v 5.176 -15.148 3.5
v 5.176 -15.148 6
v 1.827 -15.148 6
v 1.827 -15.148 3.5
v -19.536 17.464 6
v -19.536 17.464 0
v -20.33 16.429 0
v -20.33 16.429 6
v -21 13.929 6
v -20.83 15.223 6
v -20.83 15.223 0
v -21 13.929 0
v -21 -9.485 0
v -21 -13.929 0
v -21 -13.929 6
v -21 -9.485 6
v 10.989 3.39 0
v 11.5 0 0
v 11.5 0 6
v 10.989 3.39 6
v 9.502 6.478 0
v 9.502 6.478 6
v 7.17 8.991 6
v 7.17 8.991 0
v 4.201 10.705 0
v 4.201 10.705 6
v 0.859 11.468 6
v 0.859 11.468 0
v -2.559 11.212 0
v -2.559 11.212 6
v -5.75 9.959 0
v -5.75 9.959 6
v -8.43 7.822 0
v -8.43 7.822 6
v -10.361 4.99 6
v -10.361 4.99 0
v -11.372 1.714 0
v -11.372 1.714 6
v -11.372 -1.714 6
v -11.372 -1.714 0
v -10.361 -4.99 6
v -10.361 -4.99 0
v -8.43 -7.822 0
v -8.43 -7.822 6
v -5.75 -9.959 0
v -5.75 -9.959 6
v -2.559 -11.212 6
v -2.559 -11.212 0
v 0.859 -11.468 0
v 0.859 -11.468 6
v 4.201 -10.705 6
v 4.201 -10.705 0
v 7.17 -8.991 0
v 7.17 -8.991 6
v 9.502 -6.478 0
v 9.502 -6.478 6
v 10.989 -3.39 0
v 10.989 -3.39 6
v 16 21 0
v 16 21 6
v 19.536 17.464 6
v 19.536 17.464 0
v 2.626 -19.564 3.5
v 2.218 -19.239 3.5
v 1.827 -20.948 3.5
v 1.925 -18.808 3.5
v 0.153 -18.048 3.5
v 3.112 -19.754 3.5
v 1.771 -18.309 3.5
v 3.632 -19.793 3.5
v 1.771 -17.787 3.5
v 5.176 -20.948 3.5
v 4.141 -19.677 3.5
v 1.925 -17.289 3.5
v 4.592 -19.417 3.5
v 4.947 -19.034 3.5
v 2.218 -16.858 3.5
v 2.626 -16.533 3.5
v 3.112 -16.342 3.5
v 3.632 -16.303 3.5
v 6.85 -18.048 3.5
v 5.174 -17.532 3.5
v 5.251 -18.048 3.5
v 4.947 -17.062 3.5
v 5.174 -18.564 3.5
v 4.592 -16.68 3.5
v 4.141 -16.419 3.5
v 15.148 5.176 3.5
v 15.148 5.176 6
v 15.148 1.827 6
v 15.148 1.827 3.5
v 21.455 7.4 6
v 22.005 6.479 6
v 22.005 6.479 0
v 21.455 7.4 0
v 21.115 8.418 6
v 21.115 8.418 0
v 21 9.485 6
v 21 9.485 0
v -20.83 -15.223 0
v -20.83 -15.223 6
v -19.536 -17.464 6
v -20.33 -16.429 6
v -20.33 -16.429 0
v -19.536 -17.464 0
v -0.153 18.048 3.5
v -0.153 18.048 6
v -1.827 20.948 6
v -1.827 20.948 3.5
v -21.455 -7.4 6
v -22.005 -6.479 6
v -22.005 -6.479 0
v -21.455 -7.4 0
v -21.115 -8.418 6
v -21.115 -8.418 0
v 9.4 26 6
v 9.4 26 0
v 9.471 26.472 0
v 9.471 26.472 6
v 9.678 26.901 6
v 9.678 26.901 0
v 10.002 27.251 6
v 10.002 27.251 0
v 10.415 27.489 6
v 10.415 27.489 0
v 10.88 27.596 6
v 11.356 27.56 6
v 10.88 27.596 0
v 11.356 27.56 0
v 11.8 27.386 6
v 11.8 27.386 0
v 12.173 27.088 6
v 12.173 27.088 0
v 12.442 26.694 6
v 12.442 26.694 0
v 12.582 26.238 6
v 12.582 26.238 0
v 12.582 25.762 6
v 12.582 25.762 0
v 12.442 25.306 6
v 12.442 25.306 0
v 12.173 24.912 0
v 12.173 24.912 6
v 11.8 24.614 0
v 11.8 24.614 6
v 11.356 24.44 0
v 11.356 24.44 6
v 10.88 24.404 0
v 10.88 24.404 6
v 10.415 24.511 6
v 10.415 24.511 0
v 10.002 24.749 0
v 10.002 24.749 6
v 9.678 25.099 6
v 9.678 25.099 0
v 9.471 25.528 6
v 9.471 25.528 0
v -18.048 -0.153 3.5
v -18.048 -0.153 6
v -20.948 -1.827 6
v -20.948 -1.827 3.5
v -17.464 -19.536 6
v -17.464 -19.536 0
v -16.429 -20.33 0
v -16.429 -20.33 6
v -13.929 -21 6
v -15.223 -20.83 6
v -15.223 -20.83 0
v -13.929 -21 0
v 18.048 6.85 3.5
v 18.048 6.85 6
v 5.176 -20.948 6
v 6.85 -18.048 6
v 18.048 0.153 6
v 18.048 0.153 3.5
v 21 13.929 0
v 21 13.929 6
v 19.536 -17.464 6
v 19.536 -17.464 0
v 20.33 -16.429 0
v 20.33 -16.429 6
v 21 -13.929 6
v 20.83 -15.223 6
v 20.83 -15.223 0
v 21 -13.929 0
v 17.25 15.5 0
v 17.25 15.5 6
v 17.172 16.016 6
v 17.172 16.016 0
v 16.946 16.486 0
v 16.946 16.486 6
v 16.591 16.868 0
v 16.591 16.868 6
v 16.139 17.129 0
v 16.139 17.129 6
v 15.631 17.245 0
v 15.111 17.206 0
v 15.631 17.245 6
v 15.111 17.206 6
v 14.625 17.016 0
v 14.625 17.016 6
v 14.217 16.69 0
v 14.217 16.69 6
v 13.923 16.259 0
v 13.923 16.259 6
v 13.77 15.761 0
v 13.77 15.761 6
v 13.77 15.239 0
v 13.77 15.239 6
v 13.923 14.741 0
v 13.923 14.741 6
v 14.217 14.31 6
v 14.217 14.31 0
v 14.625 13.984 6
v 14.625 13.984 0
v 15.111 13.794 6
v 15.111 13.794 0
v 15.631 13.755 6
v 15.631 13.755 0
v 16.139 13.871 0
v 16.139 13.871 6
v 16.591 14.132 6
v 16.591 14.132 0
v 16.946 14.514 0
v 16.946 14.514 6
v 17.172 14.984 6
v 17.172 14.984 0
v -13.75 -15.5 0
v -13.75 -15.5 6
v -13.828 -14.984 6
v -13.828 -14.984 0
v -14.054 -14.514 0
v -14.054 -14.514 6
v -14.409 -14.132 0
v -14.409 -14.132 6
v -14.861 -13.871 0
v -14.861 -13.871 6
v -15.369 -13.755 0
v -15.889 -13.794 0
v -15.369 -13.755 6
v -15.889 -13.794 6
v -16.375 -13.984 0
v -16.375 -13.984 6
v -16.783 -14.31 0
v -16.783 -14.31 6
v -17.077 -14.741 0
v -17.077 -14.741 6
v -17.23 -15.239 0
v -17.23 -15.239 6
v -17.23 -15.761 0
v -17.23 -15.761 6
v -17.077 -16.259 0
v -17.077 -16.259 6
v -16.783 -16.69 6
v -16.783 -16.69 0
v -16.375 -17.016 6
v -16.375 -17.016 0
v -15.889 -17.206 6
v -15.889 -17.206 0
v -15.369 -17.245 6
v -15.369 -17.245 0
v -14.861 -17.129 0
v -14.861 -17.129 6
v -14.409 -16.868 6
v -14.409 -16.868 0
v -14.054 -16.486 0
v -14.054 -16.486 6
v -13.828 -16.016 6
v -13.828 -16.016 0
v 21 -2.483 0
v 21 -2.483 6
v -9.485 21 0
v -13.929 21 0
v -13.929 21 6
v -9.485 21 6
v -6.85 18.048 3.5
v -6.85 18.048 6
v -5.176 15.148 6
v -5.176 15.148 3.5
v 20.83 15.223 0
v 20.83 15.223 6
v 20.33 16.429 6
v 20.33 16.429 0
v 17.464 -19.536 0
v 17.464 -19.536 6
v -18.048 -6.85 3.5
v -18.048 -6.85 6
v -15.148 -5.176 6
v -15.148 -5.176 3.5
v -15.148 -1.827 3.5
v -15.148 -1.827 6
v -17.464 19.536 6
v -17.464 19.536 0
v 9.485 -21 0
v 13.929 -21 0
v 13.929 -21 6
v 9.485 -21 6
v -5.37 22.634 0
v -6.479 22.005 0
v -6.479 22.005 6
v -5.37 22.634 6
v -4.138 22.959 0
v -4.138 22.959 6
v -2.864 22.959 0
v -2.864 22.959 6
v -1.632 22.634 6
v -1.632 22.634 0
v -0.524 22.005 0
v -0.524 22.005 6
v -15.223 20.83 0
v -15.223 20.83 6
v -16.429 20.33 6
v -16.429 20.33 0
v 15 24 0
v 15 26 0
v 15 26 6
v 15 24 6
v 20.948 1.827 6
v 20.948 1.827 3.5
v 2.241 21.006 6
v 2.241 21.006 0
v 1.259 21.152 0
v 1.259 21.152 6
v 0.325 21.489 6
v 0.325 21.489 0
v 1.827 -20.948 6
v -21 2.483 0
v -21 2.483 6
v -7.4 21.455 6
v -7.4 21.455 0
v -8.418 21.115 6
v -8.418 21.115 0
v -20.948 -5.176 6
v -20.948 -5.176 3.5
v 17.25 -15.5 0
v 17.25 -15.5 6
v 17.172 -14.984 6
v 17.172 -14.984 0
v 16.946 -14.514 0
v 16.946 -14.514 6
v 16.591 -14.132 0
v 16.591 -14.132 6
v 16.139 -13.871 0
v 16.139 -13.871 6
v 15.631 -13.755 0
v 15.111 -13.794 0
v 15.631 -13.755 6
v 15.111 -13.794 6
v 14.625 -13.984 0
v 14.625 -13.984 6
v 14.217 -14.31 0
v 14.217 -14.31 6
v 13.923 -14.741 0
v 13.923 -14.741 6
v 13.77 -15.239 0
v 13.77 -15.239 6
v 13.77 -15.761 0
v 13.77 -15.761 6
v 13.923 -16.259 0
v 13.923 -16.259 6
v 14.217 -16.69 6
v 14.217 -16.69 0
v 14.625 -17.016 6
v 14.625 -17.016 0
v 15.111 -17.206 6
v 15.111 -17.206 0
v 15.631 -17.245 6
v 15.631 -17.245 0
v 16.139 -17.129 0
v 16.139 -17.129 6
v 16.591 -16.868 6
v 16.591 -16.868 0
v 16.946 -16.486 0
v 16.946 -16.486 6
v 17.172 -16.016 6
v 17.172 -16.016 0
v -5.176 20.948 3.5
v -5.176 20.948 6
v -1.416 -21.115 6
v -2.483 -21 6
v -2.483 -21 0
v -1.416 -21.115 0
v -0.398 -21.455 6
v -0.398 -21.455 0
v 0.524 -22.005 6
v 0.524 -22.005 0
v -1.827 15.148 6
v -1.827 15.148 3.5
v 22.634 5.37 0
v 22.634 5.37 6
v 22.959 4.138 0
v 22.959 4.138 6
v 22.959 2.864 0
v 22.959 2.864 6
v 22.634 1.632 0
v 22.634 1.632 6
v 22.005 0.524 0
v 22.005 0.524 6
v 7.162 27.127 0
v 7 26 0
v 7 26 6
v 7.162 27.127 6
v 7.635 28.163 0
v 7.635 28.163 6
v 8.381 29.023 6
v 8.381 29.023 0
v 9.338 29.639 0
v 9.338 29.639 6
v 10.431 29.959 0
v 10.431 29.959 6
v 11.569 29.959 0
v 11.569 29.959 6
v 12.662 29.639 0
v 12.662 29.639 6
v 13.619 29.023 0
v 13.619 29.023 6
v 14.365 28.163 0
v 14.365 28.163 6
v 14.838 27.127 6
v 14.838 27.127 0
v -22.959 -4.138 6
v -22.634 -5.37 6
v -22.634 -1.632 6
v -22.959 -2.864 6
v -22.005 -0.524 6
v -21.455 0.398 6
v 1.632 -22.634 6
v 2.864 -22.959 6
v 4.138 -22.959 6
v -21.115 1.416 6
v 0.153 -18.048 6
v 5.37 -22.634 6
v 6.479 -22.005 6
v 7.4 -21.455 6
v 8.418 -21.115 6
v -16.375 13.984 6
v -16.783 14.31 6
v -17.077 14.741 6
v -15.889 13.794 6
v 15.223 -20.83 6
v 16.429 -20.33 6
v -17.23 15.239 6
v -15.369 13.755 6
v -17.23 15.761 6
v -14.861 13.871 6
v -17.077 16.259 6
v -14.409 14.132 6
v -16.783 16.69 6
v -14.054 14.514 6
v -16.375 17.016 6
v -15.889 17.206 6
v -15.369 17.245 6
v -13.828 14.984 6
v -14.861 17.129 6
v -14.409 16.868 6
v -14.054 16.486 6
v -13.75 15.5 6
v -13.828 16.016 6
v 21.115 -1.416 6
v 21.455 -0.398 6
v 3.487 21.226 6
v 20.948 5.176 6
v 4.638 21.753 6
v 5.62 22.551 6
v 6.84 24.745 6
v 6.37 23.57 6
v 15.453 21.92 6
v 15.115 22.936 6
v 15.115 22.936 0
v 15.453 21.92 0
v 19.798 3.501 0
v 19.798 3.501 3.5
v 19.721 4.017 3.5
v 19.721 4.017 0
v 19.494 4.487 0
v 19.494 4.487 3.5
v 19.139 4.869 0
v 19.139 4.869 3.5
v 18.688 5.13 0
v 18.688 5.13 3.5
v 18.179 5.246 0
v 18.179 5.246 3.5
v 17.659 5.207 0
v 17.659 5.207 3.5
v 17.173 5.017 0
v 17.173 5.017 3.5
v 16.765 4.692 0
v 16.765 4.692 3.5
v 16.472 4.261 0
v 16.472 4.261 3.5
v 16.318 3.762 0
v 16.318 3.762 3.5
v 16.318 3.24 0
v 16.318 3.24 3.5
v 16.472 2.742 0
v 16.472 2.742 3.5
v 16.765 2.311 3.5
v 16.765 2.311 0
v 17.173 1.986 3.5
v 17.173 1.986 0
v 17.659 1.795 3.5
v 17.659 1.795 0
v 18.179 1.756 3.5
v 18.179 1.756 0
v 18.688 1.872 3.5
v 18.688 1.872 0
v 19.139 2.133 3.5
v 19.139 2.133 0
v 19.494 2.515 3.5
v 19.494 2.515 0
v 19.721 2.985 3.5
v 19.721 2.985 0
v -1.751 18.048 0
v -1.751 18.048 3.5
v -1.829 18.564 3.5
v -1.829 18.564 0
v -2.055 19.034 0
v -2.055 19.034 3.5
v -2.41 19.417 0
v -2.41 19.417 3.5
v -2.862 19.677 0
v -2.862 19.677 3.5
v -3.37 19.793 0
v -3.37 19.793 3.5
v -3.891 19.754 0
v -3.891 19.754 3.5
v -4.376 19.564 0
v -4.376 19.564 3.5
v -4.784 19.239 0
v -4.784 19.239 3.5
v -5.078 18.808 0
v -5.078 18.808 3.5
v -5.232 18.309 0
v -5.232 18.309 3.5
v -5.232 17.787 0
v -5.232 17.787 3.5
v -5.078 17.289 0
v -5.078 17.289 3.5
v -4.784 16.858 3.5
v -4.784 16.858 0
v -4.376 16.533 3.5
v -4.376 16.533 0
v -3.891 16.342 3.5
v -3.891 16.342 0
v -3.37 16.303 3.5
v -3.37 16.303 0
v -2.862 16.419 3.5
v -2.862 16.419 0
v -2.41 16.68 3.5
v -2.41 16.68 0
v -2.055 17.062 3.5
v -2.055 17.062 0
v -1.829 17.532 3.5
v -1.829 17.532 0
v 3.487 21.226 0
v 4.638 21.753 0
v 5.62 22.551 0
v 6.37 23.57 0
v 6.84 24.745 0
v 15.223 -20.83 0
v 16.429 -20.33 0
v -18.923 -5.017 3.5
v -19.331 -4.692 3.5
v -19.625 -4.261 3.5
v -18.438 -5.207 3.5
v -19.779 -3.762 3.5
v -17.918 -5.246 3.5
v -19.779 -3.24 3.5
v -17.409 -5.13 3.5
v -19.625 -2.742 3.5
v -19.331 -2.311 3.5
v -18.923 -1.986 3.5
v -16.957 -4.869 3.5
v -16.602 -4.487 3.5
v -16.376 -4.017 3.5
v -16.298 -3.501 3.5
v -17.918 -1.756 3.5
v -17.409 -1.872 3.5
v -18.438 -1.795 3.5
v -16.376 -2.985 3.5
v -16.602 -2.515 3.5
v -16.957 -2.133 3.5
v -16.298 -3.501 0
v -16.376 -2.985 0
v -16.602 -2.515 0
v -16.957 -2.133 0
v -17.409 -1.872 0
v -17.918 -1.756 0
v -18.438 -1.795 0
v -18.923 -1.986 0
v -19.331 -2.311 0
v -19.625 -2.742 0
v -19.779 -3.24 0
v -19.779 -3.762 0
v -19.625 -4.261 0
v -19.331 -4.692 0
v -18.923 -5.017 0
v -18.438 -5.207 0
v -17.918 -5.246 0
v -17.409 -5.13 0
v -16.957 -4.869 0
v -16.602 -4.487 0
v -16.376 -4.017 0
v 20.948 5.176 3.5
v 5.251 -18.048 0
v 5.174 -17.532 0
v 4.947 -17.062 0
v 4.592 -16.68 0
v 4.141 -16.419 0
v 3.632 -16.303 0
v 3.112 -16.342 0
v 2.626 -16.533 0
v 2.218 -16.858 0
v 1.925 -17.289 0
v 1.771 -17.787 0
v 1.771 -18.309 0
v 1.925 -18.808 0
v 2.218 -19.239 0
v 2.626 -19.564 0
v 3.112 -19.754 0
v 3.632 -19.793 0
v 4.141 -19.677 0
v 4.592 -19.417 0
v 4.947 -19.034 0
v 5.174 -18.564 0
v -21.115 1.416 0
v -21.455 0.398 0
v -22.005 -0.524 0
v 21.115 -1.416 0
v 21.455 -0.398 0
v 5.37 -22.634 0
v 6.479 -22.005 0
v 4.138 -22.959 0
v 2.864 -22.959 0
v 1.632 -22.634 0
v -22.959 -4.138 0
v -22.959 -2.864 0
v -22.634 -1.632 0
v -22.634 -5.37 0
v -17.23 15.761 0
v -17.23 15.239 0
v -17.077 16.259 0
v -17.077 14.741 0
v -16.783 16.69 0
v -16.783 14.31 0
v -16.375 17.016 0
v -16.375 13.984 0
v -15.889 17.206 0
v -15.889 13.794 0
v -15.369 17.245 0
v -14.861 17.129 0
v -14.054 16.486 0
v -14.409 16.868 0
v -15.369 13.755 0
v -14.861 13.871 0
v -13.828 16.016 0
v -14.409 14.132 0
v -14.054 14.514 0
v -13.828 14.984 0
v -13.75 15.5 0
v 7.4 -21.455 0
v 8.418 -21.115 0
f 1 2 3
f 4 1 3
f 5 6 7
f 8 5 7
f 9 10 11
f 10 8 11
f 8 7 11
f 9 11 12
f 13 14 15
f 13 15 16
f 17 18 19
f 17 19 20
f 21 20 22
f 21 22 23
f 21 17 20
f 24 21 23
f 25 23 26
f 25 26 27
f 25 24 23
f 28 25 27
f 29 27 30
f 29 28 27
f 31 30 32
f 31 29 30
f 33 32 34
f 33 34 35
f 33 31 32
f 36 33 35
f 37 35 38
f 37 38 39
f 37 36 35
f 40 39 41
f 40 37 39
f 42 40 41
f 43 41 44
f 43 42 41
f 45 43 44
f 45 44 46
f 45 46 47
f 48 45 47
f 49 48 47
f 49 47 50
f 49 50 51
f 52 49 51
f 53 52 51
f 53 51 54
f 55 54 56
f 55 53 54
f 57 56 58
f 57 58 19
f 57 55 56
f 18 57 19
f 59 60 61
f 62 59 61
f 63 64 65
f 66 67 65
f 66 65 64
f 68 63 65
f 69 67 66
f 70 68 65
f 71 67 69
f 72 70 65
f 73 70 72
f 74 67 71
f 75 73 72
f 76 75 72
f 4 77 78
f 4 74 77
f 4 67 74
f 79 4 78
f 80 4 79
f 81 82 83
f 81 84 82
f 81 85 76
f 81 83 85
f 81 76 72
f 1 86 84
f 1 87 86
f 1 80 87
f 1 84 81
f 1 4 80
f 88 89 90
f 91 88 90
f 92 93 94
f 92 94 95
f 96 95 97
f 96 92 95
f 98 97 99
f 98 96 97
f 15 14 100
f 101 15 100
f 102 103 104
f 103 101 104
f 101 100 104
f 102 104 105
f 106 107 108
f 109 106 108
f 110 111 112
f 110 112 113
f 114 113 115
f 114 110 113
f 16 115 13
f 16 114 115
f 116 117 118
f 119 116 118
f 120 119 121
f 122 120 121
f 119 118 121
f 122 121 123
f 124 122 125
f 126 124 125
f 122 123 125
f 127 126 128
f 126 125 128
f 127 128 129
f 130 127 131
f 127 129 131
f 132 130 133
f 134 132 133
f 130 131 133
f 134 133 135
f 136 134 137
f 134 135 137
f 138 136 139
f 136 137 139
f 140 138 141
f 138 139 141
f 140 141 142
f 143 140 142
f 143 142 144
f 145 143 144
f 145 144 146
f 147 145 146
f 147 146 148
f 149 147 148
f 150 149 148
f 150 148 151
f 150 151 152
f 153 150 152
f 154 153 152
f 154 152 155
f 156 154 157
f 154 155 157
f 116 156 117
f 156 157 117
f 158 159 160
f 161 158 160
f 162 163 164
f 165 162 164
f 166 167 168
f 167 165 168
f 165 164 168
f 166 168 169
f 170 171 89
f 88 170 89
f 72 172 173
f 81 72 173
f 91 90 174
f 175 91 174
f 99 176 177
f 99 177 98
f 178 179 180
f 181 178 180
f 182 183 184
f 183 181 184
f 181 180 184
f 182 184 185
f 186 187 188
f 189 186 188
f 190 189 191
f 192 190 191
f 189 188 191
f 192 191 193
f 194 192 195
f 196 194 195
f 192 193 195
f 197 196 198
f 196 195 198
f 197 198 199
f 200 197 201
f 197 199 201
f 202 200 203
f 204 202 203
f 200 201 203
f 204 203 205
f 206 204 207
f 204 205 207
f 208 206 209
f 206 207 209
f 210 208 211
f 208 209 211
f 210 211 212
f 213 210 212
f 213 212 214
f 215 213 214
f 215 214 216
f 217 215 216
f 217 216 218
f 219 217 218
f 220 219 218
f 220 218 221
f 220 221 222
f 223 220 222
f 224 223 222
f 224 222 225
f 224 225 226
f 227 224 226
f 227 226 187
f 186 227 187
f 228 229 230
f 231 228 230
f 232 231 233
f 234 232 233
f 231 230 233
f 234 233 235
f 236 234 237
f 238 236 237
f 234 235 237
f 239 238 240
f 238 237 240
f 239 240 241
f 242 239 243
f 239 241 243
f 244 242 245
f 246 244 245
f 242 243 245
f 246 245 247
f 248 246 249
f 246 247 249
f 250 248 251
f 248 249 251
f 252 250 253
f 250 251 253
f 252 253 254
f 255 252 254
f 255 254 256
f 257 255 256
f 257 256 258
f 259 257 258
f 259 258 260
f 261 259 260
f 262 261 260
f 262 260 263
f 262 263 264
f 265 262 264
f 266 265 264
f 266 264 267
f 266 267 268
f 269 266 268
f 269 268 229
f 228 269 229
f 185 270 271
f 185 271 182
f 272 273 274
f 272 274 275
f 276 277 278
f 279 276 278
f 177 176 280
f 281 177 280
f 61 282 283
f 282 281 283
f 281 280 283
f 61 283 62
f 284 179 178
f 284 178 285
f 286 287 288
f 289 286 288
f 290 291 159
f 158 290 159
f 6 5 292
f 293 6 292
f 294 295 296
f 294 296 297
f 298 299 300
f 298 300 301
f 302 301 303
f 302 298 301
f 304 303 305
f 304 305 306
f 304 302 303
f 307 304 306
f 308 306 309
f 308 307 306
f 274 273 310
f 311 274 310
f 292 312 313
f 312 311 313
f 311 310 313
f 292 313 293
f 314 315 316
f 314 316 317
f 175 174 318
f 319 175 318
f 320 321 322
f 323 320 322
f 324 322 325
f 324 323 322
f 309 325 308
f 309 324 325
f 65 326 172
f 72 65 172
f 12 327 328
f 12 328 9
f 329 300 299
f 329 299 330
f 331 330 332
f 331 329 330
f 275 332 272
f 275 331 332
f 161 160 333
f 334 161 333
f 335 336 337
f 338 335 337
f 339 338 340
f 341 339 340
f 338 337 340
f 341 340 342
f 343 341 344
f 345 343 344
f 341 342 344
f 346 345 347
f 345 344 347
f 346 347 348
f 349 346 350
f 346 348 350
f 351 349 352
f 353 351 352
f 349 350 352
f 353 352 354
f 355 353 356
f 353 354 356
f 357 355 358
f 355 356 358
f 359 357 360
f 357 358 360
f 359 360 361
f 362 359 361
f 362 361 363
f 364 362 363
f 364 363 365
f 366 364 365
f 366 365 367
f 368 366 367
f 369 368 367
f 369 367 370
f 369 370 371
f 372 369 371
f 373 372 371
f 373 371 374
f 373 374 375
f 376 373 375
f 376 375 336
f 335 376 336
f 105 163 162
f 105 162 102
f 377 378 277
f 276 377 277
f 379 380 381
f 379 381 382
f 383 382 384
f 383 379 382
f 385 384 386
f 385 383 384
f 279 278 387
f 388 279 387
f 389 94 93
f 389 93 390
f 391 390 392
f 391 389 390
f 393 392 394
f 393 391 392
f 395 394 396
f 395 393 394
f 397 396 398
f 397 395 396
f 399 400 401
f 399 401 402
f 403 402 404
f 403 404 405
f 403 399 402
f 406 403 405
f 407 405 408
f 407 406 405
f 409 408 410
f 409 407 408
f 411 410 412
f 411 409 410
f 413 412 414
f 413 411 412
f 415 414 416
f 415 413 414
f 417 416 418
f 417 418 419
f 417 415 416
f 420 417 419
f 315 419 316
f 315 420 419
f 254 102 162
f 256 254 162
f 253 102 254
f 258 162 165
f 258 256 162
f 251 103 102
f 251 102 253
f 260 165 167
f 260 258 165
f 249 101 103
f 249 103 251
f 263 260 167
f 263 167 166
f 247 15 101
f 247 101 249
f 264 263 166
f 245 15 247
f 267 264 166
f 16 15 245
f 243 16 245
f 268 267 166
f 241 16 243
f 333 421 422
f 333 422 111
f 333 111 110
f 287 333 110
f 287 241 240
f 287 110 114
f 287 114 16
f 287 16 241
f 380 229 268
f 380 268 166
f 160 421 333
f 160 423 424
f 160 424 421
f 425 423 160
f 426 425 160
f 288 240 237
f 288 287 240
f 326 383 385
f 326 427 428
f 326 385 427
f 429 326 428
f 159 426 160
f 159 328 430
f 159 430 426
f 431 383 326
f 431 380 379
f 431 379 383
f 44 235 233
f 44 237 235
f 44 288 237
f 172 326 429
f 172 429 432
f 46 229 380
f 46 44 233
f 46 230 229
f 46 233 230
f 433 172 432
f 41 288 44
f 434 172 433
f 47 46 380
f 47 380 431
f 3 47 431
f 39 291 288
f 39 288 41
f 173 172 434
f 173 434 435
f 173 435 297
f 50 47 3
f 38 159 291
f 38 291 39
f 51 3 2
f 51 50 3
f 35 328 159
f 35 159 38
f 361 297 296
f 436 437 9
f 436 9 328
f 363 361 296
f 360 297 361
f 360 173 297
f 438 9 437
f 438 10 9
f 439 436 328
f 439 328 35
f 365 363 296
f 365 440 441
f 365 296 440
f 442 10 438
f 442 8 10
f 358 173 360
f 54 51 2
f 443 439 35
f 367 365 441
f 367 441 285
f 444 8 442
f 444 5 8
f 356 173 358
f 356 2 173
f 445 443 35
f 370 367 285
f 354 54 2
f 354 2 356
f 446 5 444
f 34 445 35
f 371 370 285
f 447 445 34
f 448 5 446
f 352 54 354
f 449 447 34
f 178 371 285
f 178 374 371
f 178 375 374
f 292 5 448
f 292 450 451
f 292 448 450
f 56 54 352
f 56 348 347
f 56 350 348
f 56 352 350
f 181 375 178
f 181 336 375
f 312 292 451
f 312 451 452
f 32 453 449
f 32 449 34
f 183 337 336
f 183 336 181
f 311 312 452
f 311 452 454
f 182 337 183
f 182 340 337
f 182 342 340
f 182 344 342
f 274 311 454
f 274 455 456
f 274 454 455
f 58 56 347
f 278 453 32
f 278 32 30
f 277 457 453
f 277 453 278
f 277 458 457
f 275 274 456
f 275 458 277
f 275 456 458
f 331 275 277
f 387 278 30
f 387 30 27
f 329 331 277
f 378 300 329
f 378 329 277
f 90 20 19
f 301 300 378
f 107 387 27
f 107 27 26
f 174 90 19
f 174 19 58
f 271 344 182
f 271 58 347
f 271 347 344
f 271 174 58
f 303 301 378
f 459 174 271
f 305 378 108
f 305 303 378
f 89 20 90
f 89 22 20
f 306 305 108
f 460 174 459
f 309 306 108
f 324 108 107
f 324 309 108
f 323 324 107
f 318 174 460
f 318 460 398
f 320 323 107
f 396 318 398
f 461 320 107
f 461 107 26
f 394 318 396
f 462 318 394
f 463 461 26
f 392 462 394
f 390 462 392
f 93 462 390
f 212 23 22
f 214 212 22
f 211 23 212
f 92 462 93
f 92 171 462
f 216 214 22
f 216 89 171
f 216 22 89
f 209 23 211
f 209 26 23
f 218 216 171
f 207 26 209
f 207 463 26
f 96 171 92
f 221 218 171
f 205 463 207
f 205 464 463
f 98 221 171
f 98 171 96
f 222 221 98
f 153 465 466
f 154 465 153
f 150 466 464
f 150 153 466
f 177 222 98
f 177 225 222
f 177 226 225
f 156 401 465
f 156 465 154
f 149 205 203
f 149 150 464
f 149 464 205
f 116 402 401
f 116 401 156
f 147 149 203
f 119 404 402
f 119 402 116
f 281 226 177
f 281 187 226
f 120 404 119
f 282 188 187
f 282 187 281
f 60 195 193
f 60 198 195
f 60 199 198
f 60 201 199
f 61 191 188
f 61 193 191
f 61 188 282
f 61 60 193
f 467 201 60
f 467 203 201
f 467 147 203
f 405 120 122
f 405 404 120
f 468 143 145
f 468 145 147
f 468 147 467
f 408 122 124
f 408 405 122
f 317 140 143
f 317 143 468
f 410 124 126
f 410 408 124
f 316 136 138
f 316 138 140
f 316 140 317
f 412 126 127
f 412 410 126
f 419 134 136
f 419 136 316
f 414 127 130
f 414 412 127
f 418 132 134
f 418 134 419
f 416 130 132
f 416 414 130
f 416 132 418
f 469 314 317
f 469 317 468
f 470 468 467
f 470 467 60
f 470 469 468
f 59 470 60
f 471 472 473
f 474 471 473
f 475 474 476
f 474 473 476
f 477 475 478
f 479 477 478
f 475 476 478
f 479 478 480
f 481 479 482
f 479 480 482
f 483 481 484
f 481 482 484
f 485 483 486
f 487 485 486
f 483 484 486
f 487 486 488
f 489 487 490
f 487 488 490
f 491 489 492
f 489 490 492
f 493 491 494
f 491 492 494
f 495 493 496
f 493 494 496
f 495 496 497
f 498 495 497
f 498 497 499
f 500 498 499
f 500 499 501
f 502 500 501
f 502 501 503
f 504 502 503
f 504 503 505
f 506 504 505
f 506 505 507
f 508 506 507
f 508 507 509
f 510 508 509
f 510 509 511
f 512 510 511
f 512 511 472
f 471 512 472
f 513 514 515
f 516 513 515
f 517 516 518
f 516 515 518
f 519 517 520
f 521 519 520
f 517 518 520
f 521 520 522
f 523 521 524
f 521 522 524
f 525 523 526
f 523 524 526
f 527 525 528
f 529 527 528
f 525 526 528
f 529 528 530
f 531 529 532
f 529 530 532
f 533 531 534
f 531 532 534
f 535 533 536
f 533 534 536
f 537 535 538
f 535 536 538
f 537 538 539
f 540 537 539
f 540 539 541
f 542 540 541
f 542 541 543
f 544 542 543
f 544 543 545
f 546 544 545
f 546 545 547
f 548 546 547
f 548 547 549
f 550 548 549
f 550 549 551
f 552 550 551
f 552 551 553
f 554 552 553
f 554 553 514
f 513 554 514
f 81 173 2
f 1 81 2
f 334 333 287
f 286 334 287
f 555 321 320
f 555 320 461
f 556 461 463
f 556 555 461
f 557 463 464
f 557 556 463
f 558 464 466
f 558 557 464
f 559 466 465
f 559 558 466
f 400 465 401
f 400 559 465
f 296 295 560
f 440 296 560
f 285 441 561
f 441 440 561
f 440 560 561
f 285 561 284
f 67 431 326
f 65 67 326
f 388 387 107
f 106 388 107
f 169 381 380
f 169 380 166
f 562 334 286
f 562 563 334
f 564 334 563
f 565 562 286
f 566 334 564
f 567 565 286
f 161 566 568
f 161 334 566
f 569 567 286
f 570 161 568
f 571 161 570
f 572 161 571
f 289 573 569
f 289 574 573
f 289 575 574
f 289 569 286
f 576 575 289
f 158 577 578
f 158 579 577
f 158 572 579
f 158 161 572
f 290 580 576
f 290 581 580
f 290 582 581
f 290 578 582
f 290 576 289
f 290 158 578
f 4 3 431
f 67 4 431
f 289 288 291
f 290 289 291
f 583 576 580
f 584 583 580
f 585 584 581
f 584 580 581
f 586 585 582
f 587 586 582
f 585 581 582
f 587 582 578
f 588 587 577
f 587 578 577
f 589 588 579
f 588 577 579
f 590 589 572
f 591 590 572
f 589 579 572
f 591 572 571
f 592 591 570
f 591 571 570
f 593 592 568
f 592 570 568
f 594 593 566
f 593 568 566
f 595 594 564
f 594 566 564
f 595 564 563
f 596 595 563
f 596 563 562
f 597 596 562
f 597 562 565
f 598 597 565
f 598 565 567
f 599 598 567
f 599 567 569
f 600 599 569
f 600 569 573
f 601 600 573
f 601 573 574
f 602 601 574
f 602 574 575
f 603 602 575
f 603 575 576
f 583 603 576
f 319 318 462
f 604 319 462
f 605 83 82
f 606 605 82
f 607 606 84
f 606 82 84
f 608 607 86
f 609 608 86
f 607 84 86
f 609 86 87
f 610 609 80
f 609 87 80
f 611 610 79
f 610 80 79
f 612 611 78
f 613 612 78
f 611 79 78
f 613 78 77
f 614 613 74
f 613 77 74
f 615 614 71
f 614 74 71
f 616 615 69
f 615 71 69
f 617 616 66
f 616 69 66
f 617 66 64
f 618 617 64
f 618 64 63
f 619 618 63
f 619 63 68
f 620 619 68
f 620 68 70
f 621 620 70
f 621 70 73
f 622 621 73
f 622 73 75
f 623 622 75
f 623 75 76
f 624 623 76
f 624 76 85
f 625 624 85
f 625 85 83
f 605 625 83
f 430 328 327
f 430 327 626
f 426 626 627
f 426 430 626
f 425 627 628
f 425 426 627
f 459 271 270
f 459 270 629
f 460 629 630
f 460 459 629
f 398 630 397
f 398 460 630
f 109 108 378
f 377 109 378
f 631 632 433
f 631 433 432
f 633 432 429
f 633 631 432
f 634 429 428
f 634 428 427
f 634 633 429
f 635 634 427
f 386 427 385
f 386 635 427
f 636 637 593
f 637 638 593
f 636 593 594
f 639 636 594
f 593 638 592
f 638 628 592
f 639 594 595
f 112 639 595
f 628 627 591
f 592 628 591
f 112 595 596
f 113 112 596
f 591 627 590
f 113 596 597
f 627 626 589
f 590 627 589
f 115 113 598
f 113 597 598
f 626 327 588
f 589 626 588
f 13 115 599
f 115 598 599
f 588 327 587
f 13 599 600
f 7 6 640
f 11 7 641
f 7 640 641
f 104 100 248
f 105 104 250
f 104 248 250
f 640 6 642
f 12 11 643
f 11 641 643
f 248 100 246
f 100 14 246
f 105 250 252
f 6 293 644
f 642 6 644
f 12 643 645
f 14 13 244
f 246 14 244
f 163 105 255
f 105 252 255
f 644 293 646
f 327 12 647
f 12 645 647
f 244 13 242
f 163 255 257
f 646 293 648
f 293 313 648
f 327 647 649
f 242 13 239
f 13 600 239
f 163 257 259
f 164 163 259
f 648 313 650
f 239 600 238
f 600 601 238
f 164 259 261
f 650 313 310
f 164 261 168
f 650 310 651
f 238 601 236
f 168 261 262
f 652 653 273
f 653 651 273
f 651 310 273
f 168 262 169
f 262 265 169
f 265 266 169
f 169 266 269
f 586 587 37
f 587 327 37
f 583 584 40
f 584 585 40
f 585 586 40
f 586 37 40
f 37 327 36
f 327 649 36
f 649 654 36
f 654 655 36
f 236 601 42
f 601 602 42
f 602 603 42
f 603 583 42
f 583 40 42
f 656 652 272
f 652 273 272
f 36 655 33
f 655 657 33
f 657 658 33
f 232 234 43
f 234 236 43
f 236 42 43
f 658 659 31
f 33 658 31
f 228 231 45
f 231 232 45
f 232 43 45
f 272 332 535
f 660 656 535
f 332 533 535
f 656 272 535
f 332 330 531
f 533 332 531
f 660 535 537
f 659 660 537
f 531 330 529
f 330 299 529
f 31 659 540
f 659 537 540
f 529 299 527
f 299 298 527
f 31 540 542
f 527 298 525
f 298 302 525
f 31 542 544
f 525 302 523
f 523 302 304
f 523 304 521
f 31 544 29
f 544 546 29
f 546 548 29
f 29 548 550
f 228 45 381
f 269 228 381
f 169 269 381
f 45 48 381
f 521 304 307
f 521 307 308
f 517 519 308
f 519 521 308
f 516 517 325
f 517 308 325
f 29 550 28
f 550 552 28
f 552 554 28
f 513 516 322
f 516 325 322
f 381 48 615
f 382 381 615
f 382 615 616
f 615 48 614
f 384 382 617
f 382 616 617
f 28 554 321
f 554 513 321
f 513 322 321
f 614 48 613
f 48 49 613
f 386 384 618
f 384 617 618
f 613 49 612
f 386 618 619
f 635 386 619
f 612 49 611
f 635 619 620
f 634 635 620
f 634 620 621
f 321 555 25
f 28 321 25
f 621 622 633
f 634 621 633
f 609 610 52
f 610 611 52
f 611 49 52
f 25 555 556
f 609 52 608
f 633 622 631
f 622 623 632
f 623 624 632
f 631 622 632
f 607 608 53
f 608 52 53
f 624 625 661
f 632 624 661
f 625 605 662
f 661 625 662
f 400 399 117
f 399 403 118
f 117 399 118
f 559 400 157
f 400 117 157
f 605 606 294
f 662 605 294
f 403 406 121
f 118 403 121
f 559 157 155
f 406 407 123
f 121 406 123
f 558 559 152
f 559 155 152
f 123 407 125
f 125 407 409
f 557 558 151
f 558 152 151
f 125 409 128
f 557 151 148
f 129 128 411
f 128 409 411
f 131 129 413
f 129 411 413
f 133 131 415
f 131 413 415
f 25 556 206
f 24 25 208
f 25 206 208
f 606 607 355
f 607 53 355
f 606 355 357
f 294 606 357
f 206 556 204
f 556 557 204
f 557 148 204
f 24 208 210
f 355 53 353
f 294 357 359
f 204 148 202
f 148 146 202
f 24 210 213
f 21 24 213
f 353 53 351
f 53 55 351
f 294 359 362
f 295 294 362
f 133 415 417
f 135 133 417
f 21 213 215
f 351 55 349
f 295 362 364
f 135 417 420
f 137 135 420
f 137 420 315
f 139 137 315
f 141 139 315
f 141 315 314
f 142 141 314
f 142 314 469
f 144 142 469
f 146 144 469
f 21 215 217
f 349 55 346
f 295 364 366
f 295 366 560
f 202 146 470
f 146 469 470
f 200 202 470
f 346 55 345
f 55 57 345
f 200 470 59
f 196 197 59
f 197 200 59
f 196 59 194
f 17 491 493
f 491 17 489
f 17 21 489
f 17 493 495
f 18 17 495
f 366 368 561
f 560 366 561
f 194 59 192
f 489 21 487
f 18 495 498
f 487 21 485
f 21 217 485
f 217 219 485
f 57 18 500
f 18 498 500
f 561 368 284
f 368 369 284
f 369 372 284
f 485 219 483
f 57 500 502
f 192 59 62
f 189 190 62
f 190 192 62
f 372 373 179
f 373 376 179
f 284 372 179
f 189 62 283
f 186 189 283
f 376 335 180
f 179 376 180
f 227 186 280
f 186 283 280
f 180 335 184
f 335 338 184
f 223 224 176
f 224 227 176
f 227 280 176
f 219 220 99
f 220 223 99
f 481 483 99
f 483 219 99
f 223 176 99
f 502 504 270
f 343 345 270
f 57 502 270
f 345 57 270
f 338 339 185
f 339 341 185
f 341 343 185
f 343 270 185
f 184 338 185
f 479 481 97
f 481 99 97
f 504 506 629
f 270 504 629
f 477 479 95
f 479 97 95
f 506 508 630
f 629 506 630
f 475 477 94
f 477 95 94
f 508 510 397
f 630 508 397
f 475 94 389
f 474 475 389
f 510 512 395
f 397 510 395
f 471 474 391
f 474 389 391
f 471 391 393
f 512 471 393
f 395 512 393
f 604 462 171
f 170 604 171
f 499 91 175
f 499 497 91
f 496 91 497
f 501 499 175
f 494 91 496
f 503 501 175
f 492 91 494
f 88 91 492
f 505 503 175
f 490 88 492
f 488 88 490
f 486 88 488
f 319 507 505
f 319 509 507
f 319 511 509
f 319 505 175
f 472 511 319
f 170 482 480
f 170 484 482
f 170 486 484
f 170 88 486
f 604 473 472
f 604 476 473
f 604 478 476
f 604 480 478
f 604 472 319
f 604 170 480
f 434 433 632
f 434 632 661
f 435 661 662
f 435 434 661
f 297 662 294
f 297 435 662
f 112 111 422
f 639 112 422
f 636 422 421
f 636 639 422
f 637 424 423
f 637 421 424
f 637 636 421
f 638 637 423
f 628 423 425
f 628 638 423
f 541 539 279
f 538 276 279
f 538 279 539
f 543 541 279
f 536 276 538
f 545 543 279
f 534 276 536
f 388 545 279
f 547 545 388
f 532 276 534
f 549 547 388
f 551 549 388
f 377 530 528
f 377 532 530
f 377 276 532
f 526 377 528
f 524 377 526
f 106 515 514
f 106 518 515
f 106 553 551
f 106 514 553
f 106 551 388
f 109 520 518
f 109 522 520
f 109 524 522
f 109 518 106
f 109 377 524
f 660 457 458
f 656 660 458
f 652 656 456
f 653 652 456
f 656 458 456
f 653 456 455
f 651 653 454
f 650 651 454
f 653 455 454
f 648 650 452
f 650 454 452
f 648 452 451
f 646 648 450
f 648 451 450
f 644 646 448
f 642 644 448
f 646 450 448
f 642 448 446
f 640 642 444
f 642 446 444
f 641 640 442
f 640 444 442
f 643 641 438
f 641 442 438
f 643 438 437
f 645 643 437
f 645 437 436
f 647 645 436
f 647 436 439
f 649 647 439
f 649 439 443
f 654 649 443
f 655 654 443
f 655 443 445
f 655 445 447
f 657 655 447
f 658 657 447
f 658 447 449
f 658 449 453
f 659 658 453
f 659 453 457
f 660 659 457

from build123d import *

# Parameters (mm, degrees)
SKETCH1_R           = 11.5
BOSS_EXTRUDE1_DEPTH = 6
SKETCH5_R           = 4.951700006
BOSS_EXTRUDE3_DEPTH = 6
SKETCH2_R           = 1.75
CUT_EXTRUDE1_DEPTH  = 34.075670817
SKETCH3_R           = 1.75
CUT_EXTRUDE2_DEPTH  = 34.075670817
CUT_EXTRUDE3_DEPTH  = 2.5
SKETCH6_R           = 1.6
BOSS_EXTRUDE4_DEPTH = 6
FILLET1_R           = 5


with BuildPart() as part:
    # Sketch1 → Boss-Extrude1 (new body)
    with BuildSketch(Plane.XY):
        Polygon((-21, 16), (-16, 21), (16, 21), (21, 16), (21, -16), (16, -21), (-16, -21), (-21, -16), align=None)
        Circle(SKETCH1_R, mode=Mode.SUBTRACT)
    extrude(amount=BOSS_EXTRUDE1_DEPTH)

    # Sketch5 → Boss-Extrude3 (add)
    with BuildSketch(Plane(origin=(0, 0, 0), x_dir=(-1, 0, 0), z_dir=(0, 0, -1))):
        with Locations((-18.048299994, 3.501266534)):
            Circle(SKETCH5_R)
        with Locations((3.501266534, 18.048299994)):
            Circle(SKETCH5_R)
        with Locations((18.048299994, -3.501266534)):
            Circle(SKETCH5_R)
        with Locations((-3.501266534, -18.048299994)):
            Circle(SKETCH5_R)
    extrude(amount=-BOSS_EXTRUDE3_DEPTH)

    # Sketch2 → Cut-Extrude1 (cut, through all)
    with BuildSketch(Plane.XY.offset(6)):
        with Locations((-15.5, 15.5)):
            Circle(SKETCH2_R)
        with Locations((15.5, 15.5)):
            Circle(SKETCH2_R)
        with Locations((15.5, -15.5)):
            Circle(SKETCH2_R)
        with Locations((-15.5, -15.5)):
            Circle(SKETCH2_R)
    extrude(amount=-CUT_EXTRUDE1_DEPTH, mode=Mode.SUBTRACT)

    # Sketch3 → Cut-Extrude2 (cut, through all)
    with BuildSketch(Plane.XY.offset(6)):
        with Locations((-3.501266534, 18.048299994)):
            Circle(SKETCH3_R)
        with Locations((18.048299994, 3.501266534)):
            Circle(SKETCH3_R)
        with Locations((3.501266534, -18.048299994)):
            Circle(SKETCH3_R)
        with Locations((-18.048299994, -3.501266534)):
            Circle(SKETCH3_R)
    extrude(amount=-CUT_EXTRUDE2_DEPTH, mode=Mode.SUBTRACT)

    # Sketch4 → Cut-Extrude3 (cut)
    with BuildSketch(Plane.XY.offset(6)):
        Polygon((-0.152634973, 18.048299994), (-1.826950753, 20.948299994), (-5.175582315, 20.948299994), (-6.849898095, 18.048299994), (-5.175582315, 15.148299994), (-1.826950753, 15.148299994), align=None)
        Polygon((18.048299994, 6.849898095), (15.148299994, 5.175582315), (15.148299994, 1.826950753), (18.048299994, 0.152634973), (20.948299994, 1.826950753), (20.948299994, 5.175582315), align=None)
        Polygon((-18.048299994, -6.849898095), (-15.148299994, -5.175582315), (-15.148299994, -1.826950753), (-18.048299994, -0.152634973), (-20.948299994, -1.826950753), (-20.948299994, -5.175582315), align=None)
        Polygon((6.849898095, -18.048299994), (5.175582315, -15.148299994), (1.826950753, -15.148299994), (0.152634973, -18.048299994), (1.826950753, -20.948299994), (5.175582315, -20.948299994), align=None)
    extrude(amount=-CUT_EXTRUDE3_DEPTH, mode=Mode.SUBTRACT)

    # Sketch6 → Boss-Extrude4 (add)
    with BuildSketch(Plane(origin=(0, 0, 0), x_dir=(-1, 0, 0), z_dir=(0, 0, -1))):
        with BuildLine():
            Line((-15, 26), (-15, 21))
            Line((-15, 21), (-7, 21))
            Line((-7, 21), (-7, 26))
            ThreePointArc((-7, 26), (-11, 30), (-15, 26))
        make_face()
        with Locations((-11, 26)):
            Circle(SKETCH6_R, mode=Mode.SUBTRACT)
    extrude(amount=-BOSS_EXTRUDE4_DEPTH)

    # Fillet1
    # the kernel refuses this fillet: 5 mm, written as the material it adds along each edge
    with BuildSketch(Plane(origin=(15, 21, 0), x_dir=(1, 0, 0), z_dir=(0, 0, 1))) as fillet1_piece_1:
        with BuildLine():
            CenterArc((5, 3), FILLET1_R, 180, 36.869897646)
            Line((0, 3), (0, 0))
            Line((0, 0), (1, 0))
        make_face()
    extrude(amount=6)
    with BuildSketch(Plane(origin=(7, 21, 0), x_dir=(-1, 0, 0), z_dir=(0, 0, 1))) as fillet1_piece_2:
        with BuildLine():
            CenterArc((FILLET1_R, -FILLET1_R), FILLET1_R, 90, 90)
            Line((0, -FILLET1_R), (0, 0))
            Line((0, 0), (FILLET1_R, 0))
        make_face()
    extrude(amount=6)
    with BuildSketch(Plane(origin=(7.477043191, -21, 6), x_dir=(-0.7048105163679362, -0.7093956131927819, 0), z_dir=(0, 0, -1)), Plane(origin=(-21, -7.477043191, 6), x_dir=(-0.7093956131927642, 0.7048105163679541, 0), z_dir=(0, 0, -1))) as fillet1_piece_3:
        with BuildLine():
            CenterArc((2.13164688, -4.948591109), FILLET1_R, 98.223270181, 36.962491831)
            Line((-1.415331186, -1.424538527), (0, 0))
            ThreePointArc((0, 0), (0.708246162, -0.050912281), (1.416492325, 0))
        make_face()
    extrude(amount=6)
    with BuildSketch(Plane(origin=(-0.474510123, -21, 6), x_dir=(-1, 0, 0), z_dir=(0, 0, -1)), Plane(origin=(-21, 0.474510123, 6), x_dir=(0, 1, 0), z_dir=(0, 0, -1))) as fillet1_piece_4:
        with BuildLine():
            CenterArc((2.008101686, -5), FILLET1_R, 90, 36.962491831)
            ThreePointArc((-0.998358687, -1.004853441), (-0.463062395, -0.538310232), (0, 0))
            Line((0, 0), (2.008101686, 0))
        make_face()
    extrude(amount=6)
    with BuildSketch(Plane(origin=(-7.477043191, 21, 6), x_dir=(-1, 0, 0), z_dir=(0, 0, -1)), Plane(origin=(21, 7.477043191, 6), x_dir=(0, 1, 0), z_dir=(0, 0, -1))) as fillet1_piece_5:
        with BuildLine():
            CenterArc((2.008101686, 5), FILLET1_R, 233.037508169, 36.962491831)
            ThreePointArc((-0.998358687, 1.004853441), (-0.463062395, 0.538310232), (0, 0))
            Line((0, 0), (2.008101686, 0))
        make_face()
    extrude(amount=6)
    with BuildSketch(Plane(origin=(0.474510123, 21, 6), x_dir=(-0.7048105163680716, 0.7093956131926475, 0), z_dir=(0, 0, -1)), Plane(origin=(21, -0.474510123, 6), x_dir=(0.7093956131926695, 0.7048105163680495, 0), z_dir=(0, 0, -1))) as fillet1_piece_6:
        with BuildLine():
            CenterArc((2.13164688, 4.948591109), FILLET1_R, 224.814237988, 36.962491831)
            Line((-1.415331186, 1.424538527), (0, 0))
            ThreePointArc((0, 0), (0.708246162, 0.050912281), (1.416492325, 0))
        make_face()
    extrude(amount=6)
    # the kernel refuses this fillet: 5 mm, written as the material it takes off along each edge
    with BuildSketch(Plane(origin=(21, -16, -5.17766953), x_dir=(0, 1, 0), z_dir=(0, 0, 1)), Plane(origin=(16, -21, -5.17766953), x_dir=(0.7071067811865476, 0.7071067811865476, 0), z_dir=(0, 0, 1)), Plane(origin=(-16, -21, -5.17766953), x_dir=(1, 0, 0), z_dir=(0, 0, 1)), Plane(origin=(-21, -16, -5.17766953), x_dir=(0.7071067811865476, -0.7071067811865476, 0), z_dir=(0, 0, 1)), Plane(origin=(-16, 21, -5.17766953), x_dir=(-0.7071067811865476, -0.7071067811865476, 0), z_dir=(0, 0, 1)), Plane(origin=(21, 16, -5.17766953), x_dir=(-0.7071067811865476, 0.7071067811865476, 0), z_dir=(0, 0, 1))) as fillet1_2_piece_1:
        with BuildLine():
            CenterArc((FILLET1_R * 0.414213562373, FILLET1_R), FILLET1_R, 225, 45)
            Line((-FILLET1_R * 0.292893218813, FILLET1_R * 0.292893218813), (0, 0))
            Line((0, 0), (FILLET1_R * 0.414213562373, 0))
        make_face()
    extrude(amount=16.355339059, mode=Mode.SUBTRACT)
    with BuildSketch(Plane(origin=(-21, 16, -5.17766953), x_dir=(0.7071067811865476, 0.7071067811865476, 0), z_dir=(0, 0, 1))) as fillet1_2_piece_2:
        with BuildLine():
            CenterArc((FILLET1_R * 0.414213562373, -FILLET1_R), FILLET1_R, 90, 45)
            Line((-FILLET1_R * 0.292893218813, -FILLET1_R * 0.292893218813), (0, 0))
            Line((0, 0), (FILLET1_R * 0.414213562373, 0))
        make_face()
    extrude(amount=16.355339059, mode=Mode.SUBTRACT)


solid = part.part
